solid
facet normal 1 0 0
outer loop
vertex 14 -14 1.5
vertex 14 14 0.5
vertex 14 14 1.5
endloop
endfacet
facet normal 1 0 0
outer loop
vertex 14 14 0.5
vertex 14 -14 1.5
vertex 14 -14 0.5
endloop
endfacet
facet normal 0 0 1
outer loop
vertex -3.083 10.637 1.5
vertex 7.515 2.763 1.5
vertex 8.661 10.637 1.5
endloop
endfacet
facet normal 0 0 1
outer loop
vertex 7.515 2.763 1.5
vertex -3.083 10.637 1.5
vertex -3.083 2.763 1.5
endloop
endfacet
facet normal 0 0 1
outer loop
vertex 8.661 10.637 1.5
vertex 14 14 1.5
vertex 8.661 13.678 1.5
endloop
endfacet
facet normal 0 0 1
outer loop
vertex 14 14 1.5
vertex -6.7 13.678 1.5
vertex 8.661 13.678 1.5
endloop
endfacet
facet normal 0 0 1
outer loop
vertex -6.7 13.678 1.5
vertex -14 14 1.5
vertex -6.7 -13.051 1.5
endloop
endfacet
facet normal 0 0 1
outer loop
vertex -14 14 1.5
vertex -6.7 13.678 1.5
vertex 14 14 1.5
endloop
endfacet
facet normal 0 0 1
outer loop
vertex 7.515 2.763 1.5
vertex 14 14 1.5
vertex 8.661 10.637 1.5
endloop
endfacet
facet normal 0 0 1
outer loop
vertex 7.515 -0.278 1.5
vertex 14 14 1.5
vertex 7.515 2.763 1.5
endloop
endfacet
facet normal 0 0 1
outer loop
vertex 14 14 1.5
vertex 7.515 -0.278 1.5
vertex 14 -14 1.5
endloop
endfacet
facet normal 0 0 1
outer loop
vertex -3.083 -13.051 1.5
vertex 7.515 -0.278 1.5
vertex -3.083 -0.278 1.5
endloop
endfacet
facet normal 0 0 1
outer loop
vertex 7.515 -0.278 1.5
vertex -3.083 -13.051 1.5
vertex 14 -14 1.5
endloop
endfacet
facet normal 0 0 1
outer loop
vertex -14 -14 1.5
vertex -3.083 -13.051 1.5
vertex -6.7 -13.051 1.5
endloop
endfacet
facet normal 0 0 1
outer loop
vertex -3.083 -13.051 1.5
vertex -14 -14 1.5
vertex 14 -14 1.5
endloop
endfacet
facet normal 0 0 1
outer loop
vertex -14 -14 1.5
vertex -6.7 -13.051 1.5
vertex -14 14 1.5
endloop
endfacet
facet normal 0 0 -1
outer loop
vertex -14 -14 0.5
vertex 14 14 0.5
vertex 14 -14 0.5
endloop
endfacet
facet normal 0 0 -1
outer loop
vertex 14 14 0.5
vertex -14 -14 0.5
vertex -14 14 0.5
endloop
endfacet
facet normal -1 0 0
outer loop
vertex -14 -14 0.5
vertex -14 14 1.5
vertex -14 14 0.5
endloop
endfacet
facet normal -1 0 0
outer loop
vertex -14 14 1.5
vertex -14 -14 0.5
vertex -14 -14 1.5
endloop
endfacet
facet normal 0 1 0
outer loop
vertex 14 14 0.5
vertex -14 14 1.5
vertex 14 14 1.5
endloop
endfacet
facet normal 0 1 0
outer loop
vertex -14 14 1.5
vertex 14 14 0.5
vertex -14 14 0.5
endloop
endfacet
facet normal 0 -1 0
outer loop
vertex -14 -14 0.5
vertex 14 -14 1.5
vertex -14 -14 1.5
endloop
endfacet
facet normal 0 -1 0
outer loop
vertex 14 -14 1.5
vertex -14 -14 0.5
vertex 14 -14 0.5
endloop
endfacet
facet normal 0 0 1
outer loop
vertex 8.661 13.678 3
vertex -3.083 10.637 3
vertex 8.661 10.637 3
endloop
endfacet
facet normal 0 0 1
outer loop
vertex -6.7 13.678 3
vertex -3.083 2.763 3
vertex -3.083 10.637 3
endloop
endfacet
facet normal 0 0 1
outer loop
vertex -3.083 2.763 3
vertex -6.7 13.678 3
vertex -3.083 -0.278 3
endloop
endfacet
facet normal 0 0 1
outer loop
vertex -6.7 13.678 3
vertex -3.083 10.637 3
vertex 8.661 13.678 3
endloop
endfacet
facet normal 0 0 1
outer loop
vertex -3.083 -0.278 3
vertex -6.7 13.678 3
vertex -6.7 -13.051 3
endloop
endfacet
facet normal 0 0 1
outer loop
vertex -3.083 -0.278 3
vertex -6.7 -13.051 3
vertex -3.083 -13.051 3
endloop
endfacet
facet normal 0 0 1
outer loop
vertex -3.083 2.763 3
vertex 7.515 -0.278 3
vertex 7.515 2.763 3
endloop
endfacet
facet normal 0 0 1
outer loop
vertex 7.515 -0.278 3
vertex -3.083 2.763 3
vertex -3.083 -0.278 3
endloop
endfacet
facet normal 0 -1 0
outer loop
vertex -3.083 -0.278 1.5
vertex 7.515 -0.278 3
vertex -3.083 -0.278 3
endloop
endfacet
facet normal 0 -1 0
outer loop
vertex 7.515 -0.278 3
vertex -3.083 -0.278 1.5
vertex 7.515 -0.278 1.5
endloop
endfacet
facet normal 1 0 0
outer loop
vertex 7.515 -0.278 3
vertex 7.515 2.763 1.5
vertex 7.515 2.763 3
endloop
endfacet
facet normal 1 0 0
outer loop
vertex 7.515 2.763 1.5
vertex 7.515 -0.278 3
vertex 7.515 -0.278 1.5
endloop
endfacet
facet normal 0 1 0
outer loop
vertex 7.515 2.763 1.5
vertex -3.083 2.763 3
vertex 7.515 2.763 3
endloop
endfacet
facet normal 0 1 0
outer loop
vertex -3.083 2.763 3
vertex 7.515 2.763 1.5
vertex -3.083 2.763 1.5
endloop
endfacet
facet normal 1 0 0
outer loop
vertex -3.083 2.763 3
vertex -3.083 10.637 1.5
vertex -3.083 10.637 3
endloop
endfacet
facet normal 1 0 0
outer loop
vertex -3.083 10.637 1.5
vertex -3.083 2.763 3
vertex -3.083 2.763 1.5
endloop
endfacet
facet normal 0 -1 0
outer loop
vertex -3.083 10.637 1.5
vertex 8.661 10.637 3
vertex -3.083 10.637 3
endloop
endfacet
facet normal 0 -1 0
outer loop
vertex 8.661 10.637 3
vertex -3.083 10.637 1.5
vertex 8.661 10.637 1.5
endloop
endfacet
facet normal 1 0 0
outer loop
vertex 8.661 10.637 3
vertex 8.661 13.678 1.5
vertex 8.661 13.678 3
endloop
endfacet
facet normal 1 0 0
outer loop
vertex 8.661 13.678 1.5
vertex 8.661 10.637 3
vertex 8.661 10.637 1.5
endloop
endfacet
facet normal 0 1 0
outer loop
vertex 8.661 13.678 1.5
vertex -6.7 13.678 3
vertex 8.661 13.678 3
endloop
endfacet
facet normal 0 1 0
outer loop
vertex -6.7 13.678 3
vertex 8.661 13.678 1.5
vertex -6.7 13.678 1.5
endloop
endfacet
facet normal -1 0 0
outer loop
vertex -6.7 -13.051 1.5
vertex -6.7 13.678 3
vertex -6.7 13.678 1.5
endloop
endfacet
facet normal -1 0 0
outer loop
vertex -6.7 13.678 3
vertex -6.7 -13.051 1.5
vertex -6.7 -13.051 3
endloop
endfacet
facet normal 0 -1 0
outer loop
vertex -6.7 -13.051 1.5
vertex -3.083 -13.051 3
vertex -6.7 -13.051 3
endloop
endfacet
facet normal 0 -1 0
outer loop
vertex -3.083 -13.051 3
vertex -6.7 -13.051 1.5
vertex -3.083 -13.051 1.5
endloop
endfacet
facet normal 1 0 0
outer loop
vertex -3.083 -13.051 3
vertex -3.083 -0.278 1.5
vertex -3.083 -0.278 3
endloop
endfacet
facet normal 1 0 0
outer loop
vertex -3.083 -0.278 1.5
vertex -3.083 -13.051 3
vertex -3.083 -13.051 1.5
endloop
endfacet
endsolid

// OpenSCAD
// file: transformlib2d.scad
// Copyright (c) 2013 Oskar Linde. All rights reserved.
// License: BSD
//
// This library contains basic 2D morphology operations
//
// outset(d=1)            - creates a polygon at an offset d outside a 2D shape
// inset(d=1)             - creates a polygon at an offset d inside a 2D shape
// fillet(r=1)            - adds fillets of radius r to all concave corners of a 2D shape
// rounding(r=1)          - adds rounding to all convex corners of a 2D shape
// shell(d,center=false)  - makes a shell of width d along the edge of a 2D shape
//                        - positive values of d places the shell on the outside
//                        - negative values of d places the shell on the inside
//                        - center=true and positive d places the shell centered on the edge

module outset(d=1) {
	// Bug workaround for older OpenSCAD versions
	if (version_num() < 20130424) render() outset_extruded(d) child();
	else minkowski() {
		circle(r=d);
		children();
	}
}

module outset_extruded(d=1) {
   projection(cut=true) minkowski() {
        cylinder(r=d);
        linear_extrude(center=true) child();
   }
}

module inset(d=1) {
	 render() inverse() outset(d=d) inverse() child();
}

module fillet(r=1) {
	inset(d=r) render() outset(d=r) child();
}

module rounding(r=1) {
	outset(d=r) inset(d=r) child();
}

module shell(d,center=false) {
	if (center && d > 0) {
		difference() {
			outset(d=d/2) child();
			inset(d=d/2) child();
		}
	}
	if (!center && d > 0) {
		difference() {
			outset(d=d) child();
			child();
		}
	}
	if (!center && d < 0) {
		difference() {
			child();
			inset(d=-d) child();
		}
	}
	if (d == 0) child();
}


// Below are for internal use only

module inverse() {
	difference() {
		square(1e5,center=true);
		child();
	}
}


// TEST CODE



module mirror_x() {
	union() {
		child();
		scale([-1,1,1]) child();
	}
}

module mirror_y() {
	union() {
		child();
		scale([1,-1,1]) child();
	}
}

module mirror_z() {
	union() {
		child();
		scale([1,1,-1]) child();
	}
}

module arrow(l=1,w=.6,t=0.15) {
	mirror_y() polygon([[0,0],[l,0],[l-w/2,w/2],[l-w/2-sqrt(2)*t,w/2],[l-t/2-sqrt(2)*t,t/2],[0,t/2]]);
}

module shape() {
	polygon([[0,0],[1,0],[1.5,1],[2.5,1],[2,-1],[0,-1]]);
}

if(0) assign($fn=32) {

	for (p = [0:10*3-1]) assign(o=floor(p/3)) {
		translate([(p%3)*2.5,-o*3]) {
			//%if (p % 3 == 1) translate([0,0,1]) shape();
			if (p % 3 == 0) shape();
			if (p % 3 == 1) translate([0.6,0]) arrow();
			if (p % 3 == 2) {
				if (o == 0) inset(d=0.3) shape();
				if (o == 1) outset(d=0.3) shape();
				if (o == 2) rounding(r=0.3) shape();
				if (o == 3) fillet(r=0.3) shape();
				if (o == 4) shell(d=0.3) shape();
				if (o == 5) shell(d=-0.3) shape();
				if (o == 6) shell(d=0.3,center=true) shape();
				if (o == 7) rounding(r=0.3) fillet(r=0.3) shape();
				if (o == 8) shell(d=0.3,center=true) fillet(r=0.3) rounding(r=0.3) shape();
				if (o == 9) shell(d=-0.3) fillet(r=0.3) rounding(r=0.3) shape();
			}
		}
	}
}
// main file
use <transformlib2d.scad>


module Letter(letter, size=30, thickness=1) {
                text(letter, 
                     size=size*0.8,
                     font="Zaio:style=Regular",
                     halign="center",
                     valign="center");
}



thickness = 1;
width = 33;
length = 33;
wall_thickness = 1;
height = 15;

letter_overhang = 1;

offset = 4;

stripe_height = 0.4;
stripe_width = 10;

letter = "F";

module printletterbox(letter) {

    linear_extrude(thickness) difference() {
        square([width, length], center=true);
        outset(d=0.3) Letter(letter, size=width);
       }

    translate([0, 0, -height/2]) //before z=-2*wall_thickness
    difference() {
        cube([width, length, height], center=true);
        cube([width-2*wall_thickness, length-2*wall_thickness, height], center=true);
        //the led stripe
        //translate([0, 0, -height/2+stripe_height/2]) cube([width, stripe_width, stripe_height], center=true);
    }

}


//color("red", 1) translate([0, 0, thickness]) linear_extrude(thickness + letter_overhang) Letter(letter, size=width);


module printletter(letter) {

    translate([0, 0, thickness]) 
        cube([width-wall_thickness-offset, length-wall_thickness-offset, thickness], center=true);
    color("red", 1) translate([0, 0, thickness]) linear_extrude(thickness + letter_overhang) Letter(letter, size=width);
    
}





//connector

c_thickness = 1;
c_len_y = wall_thickness*2 + c_thickness*2;
c_len_x = stripe_width + 4;
c_height = height/3;

module connectorClip() {
    
difference() {
    union() {
        cube([c_len_x, c_len_y, c_thickness]); //ground
        cube([c_len_x, c_thickness ,c_height]); //side1
        translate([0, c_len_y-c_thickness, 0]) cube([c_len_x, c_thickness ,c_height]); //side2
    }
    translate([(c_len_x-stripe_width)/2, 0, c_thickness]) cube([stripe_width, c_len_y, c_height]);
}

}



module LetterBoxWithConnectors2(top, right, bottom, left) {
    rotate([180, 0, 0])
        difference() {
            printletterbox(letter);
            if (left) {
            translate([-width/2,0,c_thickness/2-height]) cube([c_len_y+0.3, c_len_x+0.3, c_thickness+1+stripe_height], center=true); //ground
            }
            if (right) {
            translate([width/2,0,c_thickness/2-height]) cube([c_len_y+0.3, c_len_x+0.3, c_thickness+1+stripe_height], center=true); //ground
            }
            if (top) {
            translate([0,width/2,c_thickness/2-height]) cube([c_len_x+0.3, c_len_y+0.3, c_thickness+1+stripe_height], center=true); //ground
            }
            if (bottom) {
            translate([0,-width/2,c_thickness/2-height]) cube([c_len_x+0.3, c_len_y+0.3, c_thickness+1+stripe_height], center=true); //ground
            }
    }
}

//translate([33, 0, 0]) LetterBoxWithConnectors();
//translate([0, 0, 0]) LetterBoxWithConnectors2(true, true, true, true);
//printletter(letter);

printletter(letter);





$fn=500;
/*
text = ["P", "A", "S", "C", "A", "L"];
layout = [  ["A", "A", "S", "C", "A", "L"], 
            ["P", "A", "S", "C", "A", "L"], 
            ["P", "A", "S", "C", "A", "L"],
 ["P", "A", "S", "C", "A", "L"], 
            ["P", "A", "S", "C", "A", "L"], 
            ["P", "A", "S", "C", "A", "L"],

];

step = width;

for (r=[0:step:(6-1)*step]) {
    for (i =[0:step:(6-1)*step]) {
        translate([i, r, 0]) printletterbox(layout[r/33][i/33]);
    }
}*/
